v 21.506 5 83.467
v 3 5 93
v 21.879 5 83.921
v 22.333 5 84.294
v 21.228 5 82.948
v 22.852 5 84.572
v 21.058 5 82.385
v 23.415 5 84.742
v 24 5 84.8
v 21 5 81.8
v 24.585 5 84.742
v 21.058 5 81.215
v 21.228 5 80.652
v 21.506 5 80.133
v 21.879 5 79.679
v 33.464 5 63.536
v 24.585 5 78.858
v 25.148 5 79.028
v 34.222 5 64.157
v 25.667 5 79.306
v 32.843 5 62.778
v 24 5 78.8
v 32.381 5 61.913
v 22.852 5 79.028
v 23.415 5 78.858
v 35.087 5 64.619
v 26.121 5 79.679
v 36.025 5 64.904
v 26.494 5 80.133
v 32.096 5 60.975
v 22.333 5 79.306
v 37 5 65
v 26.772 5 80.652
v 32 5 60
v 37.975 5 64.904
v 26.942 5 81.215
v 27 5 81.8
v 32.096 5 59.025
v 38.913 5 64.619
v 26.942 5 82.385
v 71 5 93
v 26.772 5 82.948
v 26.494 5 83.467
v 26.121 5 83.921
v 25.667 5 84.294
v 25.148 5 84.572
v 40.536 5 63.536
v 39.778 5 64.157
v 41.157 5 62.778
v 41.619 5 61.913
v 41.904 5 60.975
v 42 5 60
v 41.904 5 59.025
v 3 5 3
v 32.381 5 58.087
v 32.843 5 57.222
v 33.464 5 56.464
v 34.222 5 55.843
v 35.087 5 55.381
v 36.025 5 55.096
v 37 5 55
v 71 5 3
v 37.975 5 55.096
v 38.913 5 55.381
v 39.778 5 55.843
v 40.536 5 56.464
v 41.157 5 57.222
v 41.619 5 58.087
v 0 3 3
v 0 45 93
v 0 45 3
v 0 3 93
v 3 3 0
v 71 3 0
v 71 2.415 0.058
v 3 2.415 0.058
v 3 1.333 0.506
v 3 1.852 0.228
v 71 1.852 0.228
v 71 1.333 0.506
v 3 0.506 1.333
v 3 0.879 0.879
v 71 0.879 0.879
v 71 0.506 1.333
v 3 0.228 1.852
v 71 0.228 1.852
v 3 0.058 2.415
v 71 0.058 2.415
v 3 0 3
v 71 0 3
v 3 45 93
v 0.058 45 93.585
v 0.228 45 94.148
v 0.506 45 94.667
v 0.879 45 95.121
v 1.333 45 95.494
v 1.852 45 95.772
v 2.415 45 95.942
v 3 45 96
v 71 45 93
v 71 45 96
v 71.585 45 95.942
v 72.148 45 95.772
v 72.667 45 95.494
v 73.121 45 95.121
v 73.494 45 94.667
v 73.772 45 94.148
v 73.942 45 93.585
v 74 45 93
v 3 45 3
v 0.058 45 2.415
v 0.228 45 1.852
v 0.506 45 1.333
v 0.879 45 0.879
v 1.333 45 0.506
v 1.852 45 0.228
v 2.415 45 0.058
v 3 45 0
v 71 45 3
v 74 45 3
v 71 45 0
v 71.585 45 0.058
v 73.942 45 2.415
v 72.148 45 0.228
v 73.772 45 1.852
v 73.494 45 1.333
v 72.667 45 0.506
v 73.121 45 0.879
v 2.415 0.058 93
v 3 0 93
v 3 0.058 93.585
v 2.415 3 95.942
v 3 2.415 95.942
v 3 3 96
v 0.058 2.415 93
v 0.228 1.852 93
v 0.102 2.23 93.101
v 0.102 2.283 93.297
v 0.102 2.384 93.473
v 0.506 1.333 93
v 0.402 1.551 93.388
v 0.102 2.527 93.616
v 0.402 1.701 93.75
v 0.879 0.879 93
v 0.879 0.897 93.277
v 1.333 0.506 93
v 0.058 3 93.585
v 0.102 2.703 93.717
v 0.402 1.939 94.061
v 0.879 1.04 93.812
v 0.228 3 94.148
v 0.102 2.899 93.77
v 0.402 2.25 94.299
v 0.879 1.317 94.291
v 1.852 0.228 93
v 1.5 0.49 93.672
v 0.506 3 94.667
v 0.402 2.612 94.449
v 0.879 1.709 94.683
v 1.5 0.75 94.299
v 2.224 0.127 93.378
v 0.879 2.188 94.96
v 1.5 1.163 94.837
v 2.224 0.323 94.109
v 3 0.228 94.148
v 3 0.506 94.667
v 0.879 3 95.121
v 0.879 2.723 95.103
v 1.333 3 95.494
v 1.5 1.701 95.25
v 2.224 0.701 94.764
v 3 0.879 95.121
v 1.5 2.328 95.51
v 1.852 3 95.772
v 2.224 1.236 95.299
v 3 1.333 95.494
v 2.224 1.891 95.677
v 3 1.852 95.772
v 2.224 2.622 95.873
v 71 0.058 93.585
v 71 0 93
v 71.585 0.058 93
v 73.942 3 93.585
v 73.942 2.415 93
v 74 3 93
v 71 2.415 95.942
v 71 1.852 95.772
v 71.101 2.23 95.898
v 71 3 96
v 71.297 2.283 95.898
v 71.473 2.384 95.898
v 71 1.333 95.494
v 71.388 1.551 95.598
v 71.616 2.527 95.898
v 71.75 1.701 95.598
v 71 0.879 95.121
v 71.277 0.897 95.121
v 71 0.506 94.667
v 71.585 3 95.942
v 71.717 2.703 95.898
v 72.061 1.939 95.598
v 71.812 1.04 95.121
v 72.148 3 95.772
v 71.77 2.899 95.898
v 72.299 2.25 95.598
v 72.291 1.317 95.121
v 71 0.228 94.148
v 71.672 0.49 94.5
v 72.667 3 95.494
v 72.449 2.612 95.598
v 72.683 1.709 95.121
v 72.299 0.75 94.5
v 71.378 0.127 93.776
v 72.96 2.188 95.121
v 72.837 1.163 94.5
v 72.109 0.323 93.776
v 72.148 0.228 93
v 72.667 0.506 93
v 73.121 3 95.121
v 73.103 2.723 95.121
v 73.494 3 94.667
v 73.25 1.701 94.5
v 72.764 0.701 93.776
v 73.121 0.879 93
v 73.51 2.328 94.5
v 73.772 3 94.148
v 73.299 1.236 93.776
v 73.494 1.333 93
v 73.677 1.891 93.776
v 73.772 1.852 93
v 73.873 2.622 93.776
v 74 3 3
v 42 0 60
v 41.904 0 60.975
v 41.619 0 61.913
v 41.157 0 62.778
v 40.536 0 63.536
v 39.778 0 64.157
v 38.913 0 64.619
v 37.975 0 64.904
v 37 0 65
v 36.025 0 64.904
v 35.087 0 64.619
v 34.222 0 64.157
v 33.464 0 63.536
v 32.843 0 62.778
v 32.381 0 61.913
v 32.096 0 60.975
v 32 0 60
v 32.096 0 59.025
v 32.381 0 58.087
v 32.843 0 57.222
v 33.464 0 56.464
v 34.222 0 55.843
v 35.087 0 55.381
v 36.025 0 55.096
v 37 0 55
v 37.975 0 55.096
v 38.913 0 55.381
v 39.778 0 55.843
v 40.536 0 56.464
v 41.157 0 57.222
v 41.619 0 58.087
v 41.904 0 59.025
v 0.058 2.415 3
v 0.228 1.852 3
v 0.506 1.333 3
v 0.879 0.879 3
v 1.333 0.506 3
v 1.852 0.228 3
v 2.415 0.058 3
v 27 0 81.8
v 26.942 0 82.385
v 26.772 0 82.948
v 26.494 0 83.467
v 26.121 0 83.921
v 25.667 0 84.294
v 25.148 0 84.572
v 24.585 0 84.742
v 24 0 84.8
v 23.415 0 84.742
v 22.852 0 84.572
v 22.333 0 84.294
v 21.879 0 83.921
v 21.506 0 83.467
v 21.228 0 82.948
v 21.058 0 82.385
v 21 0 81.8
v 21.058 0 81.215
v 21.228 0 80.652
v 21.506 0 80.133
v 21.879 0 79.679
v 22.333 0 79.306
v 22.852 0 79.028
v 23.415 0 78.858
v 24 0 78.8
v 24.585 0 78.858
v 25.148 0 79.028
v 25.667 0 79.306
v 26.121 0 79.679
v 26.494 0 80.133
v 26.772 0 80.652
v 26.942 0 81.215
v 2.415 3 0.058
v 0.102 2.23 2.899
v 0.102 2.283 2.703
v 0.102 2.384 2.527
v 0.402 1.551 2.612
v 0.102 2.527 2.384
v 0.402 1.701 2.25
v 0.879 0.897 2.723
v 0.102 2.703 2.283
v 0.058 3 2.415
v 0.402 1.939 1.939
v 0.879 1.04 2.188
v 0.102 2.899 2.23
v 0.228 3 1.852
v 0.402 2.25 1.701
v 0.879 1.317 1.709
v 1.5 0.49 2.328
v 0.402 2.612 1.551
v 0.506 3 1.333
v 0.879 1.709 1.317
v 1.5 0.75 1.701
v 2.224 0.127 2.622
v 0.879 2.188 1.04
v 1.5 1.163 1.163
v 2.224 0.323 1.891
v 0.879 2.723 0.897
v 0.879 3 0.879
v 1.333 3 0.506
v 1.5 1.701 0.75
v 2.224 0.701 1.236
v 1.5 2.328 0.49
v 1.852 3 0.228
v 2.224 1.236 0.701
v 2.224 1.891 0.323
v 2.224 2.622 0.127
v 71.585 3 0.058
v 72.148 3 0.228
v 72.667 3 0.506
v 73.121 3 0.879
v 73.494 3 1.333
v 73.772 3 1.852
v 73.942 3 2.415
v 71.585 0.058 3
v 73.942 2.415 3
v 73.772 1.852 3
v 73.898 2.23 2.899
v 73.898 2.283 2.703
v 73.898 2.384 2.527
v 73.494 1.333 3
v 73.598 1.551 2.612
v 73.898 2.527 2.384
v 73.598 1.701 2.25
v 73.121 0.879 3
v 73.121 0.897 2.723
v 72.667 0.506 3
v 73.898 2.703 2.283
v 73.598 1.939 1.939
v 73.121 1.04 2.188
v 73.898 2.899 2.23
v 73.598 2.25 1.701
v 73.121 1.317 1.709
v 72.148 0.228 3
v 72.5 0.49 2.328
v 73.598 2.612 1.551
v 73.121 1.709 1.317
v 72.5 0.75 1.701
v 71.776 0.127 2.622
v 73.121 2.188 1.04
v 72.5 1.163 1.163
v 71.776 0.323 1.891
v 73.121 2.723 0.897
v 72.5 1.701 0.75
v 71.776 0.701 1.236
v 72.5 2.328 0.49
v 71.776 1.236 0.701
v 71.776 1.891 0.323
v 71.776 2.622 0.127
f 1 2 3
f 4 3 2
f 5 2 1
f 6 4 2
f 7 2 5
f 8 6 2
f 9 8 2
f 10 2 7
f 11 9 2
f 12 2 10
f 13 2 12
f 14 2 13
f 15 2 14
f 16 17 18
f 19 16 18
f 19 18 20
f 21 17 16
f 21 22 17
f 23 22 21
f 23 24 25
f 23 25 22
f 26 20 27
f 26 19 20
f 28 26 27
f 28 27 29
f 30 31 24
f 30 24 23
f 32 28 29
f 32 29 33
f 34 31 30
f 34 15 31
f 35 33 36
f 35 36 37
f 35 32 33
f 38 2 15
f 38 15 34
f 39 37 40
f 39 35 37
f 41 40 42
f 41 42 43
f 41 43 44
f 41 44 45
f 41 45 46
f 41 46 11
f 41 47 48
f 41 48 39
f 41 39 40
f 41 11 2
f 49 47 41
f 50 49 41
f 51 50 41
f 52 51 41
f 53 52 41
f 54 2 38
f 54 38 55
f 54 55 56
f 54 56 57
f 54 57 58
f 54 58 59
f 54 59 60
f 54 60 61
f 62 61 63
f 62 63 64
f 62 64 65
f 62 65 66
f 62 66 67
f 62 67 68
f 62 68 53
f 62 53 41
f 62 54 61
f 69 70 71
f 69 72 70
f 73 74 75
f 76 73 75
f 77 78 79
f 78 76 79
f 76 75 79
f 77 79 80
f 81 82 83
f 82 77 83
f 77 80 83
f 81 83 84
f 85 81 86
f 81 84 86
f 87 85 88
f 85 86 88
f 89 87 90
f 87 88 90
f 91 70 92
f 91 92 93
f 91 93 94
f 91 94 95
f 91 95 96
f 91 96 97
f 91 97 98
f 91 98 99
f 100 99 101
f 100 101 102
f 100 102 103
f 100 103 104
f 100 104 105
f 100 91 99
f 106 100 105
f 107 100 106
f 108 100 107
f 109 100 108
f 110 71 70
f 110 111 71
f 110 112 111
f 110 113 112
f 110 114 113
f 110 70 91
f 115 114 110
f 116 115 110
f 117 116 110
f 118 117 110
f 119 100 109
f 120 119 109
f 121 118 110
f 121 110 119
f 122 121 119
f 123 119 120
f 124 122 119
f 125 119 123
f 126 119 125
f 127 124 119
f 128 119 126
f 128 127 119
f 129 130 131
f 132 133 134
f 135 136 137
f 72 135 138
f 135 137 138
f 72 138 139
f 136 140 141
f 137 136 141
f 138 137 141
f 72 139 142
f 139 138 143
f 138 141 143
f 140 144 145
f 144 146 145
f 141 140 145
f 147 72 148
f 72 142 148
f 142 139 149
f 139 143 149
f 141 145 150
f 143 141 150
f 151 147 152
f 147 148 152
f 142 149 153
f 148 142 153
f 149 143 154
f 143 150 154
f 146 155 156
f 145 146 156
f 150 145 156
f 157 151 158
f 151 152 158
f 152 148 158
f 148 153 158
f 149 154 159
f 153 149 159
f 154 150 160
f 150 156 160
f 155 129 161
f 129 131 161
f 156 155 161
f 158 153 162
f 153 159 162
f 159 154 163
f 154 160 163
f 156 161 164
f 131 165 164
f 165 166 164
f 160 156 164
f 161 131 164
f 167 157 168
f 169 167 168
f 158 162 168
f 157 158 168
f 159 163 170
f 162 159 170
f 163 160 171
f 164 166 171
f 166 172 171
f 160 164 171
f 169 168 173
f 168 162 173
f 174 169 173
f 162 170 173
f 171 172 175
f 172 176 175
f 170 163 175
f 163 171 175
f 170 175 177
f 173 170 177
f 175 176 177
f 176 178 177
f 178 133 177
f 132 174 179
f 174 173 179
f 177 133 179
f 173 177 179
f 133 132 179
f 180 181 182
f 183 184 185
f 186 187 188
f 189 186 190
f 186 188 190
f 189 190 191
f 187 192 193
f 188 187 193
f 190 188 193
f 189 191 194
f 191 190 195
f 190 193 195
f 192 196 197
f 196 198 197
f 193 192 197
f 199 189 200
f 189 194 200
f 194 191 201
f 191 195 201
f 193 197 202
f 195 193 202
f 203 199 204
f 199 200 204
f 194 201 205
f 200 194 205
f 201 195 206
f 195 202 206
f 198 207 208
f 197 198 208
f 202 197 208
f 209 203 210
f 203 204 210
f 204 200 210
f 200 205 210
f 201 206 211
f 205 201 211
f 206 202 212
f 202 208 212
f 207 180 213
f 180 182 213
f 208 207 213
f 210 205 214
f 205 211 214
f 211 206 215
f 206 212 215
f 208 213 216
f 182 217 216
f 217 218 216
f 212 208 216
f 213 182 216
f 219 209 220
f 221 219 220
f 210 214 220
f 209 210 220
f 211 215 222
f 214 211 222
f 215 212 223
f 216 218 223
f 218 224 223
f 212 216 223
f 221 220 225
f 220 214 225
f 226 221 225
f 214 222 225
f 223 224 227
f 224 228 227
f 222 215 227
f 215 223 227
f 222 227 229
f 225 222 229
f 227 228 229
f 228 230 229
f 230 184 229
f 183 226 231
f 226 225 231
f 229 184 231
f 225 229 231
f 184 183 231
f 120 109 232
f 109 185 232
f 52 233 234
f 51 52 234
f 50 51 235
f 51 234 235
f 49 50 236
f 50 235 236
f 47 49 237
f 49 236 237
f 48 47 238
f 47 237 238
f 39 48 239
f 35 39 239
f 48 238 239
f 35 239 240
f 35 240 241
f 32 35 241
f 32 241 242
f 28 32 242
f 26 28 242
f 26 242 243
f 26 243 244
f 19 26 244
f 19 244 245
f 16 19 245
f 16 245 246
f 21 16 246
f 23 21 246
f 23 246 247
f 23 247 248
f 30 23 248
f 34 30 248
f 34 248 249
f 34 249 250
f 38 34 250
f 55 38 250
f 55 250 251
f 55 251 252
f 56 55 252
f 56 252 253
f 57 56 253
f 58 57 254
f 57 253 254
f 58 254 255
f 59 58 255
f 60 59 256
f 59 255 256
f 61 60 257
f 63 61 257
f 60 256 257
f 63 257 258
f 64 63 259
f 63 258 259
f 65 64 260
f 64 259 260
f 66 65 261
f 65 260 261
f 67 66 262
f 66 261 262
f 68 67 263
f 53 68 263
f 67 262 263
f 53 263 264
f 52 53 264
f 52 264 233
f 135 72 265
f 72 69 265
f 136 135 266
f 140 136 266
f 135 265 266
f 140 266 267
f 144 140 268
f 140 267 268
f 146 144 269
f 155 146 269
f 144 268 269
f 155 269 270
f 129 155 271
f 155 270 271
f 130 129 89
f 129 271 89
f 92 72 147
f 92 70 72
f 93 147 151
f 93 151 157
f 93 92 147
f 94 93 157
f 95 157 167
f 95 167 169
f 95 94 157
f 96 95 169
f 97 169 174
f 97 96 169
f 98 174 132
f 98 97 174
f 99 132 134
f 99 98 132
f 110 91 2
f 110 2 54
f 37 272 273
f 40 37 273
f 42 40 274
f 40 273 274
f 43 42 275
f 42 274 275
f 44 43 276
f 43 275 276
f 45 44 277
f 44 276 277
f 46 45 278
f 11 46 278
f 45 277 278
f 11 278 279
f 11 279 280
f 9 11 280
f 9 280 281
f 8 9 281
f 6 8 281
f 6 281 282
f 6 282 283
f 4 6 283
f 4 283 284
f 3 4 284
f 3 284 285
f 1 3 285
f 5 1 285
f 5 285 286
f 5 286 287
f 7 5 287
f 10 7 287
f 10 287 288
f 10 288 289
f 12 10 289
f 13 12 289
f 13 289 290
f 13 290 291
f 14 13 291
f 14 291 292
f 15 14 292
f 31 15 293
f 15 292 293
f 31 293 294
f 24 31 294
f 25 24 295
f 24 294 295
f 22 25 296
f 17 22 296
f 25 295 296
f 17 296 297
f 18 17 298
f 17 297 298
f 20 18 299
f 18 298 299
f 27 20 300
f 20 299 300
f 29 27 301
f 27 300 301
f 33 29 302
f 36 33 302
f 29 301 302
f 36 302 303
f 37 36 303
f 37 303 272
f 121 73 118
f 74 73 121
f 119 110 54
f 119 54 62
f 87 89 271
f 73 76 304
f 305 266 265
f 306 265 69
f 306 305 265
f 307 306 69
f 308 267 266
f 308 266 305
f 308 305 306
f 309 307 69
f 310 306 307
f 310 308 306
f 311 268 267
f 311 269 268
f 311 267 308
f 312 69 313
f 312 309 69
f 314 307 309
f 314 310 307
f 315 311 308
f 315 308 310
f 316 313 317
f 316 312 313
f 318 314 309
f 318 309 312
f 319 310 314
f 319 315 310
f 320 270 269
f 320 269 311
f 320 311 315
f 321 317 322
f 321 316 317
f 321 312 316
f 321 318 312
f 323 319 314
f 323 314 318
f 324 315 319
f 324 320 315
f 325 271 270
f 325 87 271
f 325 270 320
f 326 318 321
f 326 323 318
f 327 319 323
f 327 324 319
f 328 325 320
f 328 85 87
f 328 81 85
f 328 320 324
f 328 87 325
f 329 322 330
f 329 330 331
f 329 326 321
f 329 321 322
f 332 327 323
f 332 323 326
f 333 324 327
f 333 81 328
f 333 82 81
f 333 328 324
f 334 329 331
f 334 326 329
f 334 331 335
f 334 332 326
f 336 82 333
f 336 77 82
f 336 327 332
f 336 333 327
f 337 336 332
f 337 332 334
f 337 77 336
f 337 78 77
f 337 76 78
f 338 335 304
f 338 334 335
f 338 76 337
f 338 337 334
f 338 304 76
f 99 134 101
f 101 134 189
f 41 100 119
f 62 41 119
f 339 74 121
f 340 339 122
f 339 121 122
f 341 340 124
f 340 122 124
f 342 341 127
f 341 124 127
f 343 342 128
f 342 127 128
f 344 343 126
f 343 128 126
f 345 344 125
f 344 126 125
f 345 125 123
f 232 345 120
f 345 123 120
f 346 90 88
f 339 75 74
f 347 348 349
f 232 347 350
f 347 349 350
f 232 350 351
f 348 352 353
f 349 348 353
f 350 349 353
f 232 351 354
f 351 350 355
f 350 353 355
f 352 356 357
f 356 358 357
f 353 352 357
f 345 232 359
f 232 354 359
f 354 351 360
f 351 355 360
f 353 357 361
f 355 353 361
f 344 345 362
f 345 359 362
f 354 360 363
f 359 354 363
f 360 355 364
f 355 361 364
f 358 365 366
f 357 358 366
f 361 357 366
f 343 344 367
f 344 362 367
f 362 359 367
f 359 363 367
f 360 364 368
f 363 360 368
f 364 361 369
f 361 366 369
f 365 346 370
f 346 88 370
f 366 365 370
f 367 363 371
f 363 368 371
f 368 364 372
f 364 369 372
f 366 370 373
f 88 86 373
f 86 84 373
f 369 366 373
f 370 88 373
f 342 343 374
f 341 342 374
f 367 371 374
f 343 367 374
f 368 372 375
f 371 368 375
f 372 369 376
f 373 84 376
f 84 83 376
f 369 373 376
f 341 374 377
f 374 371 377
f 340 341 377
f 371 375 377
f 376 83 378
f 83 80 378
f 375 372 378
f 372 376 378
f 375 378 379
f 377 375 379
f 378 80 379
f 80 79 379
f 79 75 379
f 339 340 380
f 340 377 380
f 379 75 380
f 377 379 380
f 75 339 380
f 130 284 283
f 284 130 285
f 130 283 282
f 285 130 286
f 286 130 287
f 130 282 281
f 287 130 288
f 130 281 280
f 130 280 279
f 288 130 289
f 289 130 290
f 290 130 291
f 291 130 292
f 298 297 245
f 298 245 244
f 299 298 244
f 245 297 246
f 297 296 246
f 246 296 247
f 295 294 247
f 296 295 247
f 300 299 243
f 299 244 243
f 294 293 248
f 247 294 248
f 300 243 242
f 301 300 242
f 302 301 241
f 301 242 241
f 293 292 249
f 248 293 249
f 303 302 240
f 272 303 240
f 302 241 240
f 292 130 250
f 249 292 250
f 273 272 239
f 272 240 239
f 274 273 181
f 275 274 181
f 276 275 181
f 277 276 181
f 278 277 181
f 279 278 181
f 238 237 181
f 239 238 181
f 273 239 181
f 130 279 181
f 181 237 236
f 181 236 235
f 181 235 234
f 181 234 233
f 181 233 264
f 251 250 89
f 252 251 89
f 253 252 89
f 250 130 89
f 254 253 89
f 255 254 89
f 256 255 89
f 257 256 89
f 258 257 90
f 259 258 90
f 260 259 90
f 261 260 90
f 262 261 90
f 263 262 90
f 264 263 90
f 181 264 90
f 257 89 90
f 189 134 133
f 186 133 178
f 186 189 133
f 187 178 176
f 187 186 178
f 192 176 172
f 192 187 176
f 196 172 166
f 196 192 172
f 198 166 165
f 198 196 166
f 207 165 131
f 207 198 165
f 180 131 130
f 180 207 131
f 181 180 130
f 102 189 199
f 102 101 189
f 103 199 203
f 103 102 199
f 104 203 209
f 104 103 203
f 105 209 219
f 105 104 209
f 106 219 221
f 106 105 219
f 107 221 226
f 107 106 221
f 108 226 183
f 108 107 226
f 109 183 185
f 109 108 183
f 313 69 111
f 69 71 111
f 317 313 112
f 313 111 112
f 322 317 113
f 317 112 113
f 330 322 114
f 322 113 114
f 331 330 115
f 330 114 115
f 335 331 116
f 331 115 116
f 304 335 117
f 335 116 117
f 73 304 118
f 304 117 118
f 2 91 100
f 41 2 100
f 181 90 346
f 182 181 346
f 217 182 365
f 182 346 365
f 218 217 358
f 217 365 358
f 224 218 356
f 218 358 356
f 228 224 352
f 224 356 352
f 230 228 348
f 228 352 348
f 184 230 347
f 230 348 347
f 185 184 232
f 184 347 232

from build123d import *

# Parameters (mm, degrees)
SKETCH1_W           = 74
SKETCH1_H           = 96
BOSS_EXTRUDE1_DEPTH = 45
SKETCH2_W           = 68
SKETCH2_H           = 90
CUT_EXTRUDE1_DEPTH  = 40
SKETCH3_R           = 3
SKETCH3_R_2         = 5
CUT_EXTRUDE2_DEPTH  = 40
FILLET1_R           = 3


with BuildPart() as part:
    # Sketch1 → Boss-Extrude1 (new body)
    with BuildSketch(Plane(origin=(0, 0, 0), x_dir=(1, 0, 0), z_dir=(0, 1, 0))):
        with Locations((37, -48)):
            Rectangle(SKETCH1_W, SKETCH1_H)
    extrude(amount=BOSS_EXTRUDE1_DEPTH)

    # Sketch2 → Cut-Extrude1 (cut)
    with BuildSketch(Plane(origin=(0, 45, 0), x_dir=(1, 0, 0), z_dir=(0, 1, 0))):
        with Locations((37, -48)):
            Rectangle(SKETCH2_W, SKETCH2_H)
    extrude(amount=-CUT_EXTRUDE1_DEPTH, mode=Mode.SUBTRACT)

    # Sketch3 → Cut-Extrude2 (cut)
    with BuildSketch(Plane.XZ):
        with Locations((24, 81.8)):
            Circle(SKETCH3_R)
        with Locations((37, 60)):
            Circle(SKETCH3_R_2)
    extrude(amount=-CUT_EXTRUDE2_DEPTH, mode=Mode.SUBTRACT)

    # Fillet1
    fillet1_edges = [part.edges().sort_by_distance(p)[0] for p in [
        (37, 0, 0),
        (74, 0, 48),
        (37, 0, 96),
        (0, 0, 48),
        (0, 22.5, 0),
        (74, 22.5, 0),
        (74, 22.5, 96),
        (0, 22.5, 96),
    ]]
    fillet(fillet1_edges, radius=FILLET1_R)


solid = part.part
